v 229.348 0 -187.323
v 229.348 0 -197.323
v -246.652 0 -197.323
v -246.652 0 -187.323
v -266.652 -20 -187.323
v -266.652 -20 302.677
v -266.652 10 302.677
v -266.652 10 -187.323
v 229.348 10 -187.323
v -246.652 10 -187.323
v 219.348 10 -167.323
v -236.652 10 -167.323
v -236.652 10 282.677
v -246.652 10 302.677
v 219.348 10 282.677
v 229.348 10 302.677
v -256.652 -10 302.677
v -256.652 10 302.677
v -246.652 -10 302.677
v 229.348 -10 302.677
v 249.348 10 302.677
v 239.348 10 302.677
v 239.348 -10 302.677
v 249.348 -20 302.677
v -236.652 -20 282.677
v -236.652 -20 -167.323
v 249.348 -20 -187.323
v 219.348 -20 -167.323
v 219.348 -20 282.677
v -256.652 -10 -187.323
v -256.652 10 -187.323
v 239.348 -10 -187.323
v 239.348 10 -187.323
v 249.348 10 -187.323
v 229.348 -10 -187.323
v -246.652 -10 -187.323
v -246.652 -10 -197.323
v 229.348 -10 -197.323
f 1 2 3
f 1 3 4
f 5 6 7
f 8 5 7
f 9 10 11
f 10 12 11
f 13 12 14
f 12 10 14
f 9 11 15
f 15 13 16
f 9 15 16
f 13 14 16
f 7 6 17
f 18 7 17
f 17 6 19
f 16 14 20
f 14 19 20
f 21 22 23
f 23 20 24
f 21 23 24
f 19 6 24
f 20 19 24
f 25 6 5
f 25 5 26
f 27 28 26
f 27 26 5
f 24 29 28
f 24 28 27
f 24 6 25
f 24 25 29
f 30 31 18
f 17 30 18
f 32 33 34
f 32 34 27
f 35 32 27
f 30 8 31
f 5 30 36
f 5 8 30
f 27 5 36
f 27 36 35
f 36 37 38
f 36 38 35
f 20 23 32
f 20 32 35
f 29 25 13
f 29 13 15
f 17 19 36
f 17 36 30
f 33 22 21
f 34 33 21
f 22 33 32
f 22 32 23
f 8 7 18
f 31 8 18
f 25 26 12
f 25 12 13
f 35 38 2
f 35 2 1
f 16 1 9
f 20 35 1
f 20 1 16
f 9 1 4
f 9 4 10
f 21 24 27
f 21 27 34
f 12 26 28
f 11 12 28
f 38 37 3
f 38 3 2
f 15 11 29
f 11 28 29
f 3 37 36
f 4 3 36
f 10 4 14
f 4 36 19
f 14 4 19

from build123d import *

# Parameters (mm, degrees)
F0_W      = 536
F0_H      = 500
F0_W_2    = 456
F0_H_2    = 450
F1_DEPTH  = 20
F2_W      = 10
F2_H      = 10
F3_DEPTH  = 536
F4_W      = 10
F4_H      = 500
F5_DEPTH  = 10
F6_W      = 10
F6_H      = 10
F7_DEPTH  = 20
F8_W      = 10
F8_H      = 10
F9_DEPTH  = 20
F10_W     = 10
F10_H     = 20
F11_DEPTH = 490
F12_DEPTH = 10
F13_W     = 10
F13_H     = 10
F14_DEPTH = 476


with BuildPart() as f1:
    # F0 (on Front) → F1 (new body)
    with BuildSketch(Plane.XZ):
        with Locations((-8.6522214115, 52.6769706468)):
            Rectangle(F0_W, F0_H)
        with Locations((-8.6522214115, 57.6769706468)):
            Rectangle(F0_W_2, F0_H_2, mode=Mode.SUBTRACT)
    extrude(amount=F1_DEPTH)

    # F2 (on face) → F3 (cut, through all)
    with BuildSketch(Plane(origin=(-276.6522214115, 0, 0), x_dir=(0, -1, 0), z_dir=(-1, 0, 0))):
        with Locations((15, -192.3230293532)):
            Rectangle(F2_W, F2_H)
    extrude(amount=-F3_DEPTH, mode=Mode.SUBTRACT)

    # F4 (on face) → F5 (cut)
    with BuildSketch(Plane(origin=(0, 0, 0), x_dir=(-1, 0, 0), z_dir=(0, 1, 0))):
        with Locations((251.6522214115, 52.6769706468)):
            Rectangle(F4_W, F4_H)
        with Locations((-234.3477785885, 52.6769706468)):
            Rectangle(F4_W, F4_H)
    extrude(amount=-F5_DEPTH, mode=Mode.SUBTRACT)

    # F6 (on face) → F7 (cut, through all)
    with BuildSketch(Plane.YZ.offset(259.3477785885)):
        with Locations((-5, -192.3230293532)):
            Rectangle(F6_W, F6_H)
    extrude(amount=-F7_DEPTH, mode=Mode.SUBTRACT)

    # F8 (on face) → F9 (cut, through all)
    with BuildSketch(Plane(origin=(-276.6522214115, 0, 0), x_dir=(0, -1, 0), z_dir=(-1, 0, 0))):
        with Locations((5, -192.3230293532)):
            Rectangle(F8_W, F8_H)
    extrude(amount=-F9_DEPTH, mode=Mode.SUBTRACT)

    # F10 (on face) → F11 (cut, through all)
    with BuildSketch(Plane.XY.offset(302.6769706468)):
        with Locations((-271.6522214115, -10)):
            Rectangle(F10_W, F10_H)
        with Locations((254.3477785885, -10)):
            Rectangle(F10_W, F10_H)
    extrude(amount=-F11_DEPTH, mode=Mode.SUBTRACT)

    # F12 (add): faces of the model
    f12_faces = [f1.faces().sort_by_distance(p)[0] for p in [
        (222.4443301749, 0, 52.6769706468),
        (244.3477785885, 0, 57.6769706468),
        (-261.6522214115, 0, 57.6769706468),
    ]]
    extrude(f12_faces, amount=F12_DEPTH)

    # F13 (on face) → F14 (cut, through all)
    with BuildSketch(Plane.YZ.offset(229.3477785885)):
        with Locations((5, -192.3230293532)):
            Rectangle(F13_W, F13_H)
    extrude(amount=-F14_DEPTH, mode=Mode.SUBTRACT)


solid = f1.part
